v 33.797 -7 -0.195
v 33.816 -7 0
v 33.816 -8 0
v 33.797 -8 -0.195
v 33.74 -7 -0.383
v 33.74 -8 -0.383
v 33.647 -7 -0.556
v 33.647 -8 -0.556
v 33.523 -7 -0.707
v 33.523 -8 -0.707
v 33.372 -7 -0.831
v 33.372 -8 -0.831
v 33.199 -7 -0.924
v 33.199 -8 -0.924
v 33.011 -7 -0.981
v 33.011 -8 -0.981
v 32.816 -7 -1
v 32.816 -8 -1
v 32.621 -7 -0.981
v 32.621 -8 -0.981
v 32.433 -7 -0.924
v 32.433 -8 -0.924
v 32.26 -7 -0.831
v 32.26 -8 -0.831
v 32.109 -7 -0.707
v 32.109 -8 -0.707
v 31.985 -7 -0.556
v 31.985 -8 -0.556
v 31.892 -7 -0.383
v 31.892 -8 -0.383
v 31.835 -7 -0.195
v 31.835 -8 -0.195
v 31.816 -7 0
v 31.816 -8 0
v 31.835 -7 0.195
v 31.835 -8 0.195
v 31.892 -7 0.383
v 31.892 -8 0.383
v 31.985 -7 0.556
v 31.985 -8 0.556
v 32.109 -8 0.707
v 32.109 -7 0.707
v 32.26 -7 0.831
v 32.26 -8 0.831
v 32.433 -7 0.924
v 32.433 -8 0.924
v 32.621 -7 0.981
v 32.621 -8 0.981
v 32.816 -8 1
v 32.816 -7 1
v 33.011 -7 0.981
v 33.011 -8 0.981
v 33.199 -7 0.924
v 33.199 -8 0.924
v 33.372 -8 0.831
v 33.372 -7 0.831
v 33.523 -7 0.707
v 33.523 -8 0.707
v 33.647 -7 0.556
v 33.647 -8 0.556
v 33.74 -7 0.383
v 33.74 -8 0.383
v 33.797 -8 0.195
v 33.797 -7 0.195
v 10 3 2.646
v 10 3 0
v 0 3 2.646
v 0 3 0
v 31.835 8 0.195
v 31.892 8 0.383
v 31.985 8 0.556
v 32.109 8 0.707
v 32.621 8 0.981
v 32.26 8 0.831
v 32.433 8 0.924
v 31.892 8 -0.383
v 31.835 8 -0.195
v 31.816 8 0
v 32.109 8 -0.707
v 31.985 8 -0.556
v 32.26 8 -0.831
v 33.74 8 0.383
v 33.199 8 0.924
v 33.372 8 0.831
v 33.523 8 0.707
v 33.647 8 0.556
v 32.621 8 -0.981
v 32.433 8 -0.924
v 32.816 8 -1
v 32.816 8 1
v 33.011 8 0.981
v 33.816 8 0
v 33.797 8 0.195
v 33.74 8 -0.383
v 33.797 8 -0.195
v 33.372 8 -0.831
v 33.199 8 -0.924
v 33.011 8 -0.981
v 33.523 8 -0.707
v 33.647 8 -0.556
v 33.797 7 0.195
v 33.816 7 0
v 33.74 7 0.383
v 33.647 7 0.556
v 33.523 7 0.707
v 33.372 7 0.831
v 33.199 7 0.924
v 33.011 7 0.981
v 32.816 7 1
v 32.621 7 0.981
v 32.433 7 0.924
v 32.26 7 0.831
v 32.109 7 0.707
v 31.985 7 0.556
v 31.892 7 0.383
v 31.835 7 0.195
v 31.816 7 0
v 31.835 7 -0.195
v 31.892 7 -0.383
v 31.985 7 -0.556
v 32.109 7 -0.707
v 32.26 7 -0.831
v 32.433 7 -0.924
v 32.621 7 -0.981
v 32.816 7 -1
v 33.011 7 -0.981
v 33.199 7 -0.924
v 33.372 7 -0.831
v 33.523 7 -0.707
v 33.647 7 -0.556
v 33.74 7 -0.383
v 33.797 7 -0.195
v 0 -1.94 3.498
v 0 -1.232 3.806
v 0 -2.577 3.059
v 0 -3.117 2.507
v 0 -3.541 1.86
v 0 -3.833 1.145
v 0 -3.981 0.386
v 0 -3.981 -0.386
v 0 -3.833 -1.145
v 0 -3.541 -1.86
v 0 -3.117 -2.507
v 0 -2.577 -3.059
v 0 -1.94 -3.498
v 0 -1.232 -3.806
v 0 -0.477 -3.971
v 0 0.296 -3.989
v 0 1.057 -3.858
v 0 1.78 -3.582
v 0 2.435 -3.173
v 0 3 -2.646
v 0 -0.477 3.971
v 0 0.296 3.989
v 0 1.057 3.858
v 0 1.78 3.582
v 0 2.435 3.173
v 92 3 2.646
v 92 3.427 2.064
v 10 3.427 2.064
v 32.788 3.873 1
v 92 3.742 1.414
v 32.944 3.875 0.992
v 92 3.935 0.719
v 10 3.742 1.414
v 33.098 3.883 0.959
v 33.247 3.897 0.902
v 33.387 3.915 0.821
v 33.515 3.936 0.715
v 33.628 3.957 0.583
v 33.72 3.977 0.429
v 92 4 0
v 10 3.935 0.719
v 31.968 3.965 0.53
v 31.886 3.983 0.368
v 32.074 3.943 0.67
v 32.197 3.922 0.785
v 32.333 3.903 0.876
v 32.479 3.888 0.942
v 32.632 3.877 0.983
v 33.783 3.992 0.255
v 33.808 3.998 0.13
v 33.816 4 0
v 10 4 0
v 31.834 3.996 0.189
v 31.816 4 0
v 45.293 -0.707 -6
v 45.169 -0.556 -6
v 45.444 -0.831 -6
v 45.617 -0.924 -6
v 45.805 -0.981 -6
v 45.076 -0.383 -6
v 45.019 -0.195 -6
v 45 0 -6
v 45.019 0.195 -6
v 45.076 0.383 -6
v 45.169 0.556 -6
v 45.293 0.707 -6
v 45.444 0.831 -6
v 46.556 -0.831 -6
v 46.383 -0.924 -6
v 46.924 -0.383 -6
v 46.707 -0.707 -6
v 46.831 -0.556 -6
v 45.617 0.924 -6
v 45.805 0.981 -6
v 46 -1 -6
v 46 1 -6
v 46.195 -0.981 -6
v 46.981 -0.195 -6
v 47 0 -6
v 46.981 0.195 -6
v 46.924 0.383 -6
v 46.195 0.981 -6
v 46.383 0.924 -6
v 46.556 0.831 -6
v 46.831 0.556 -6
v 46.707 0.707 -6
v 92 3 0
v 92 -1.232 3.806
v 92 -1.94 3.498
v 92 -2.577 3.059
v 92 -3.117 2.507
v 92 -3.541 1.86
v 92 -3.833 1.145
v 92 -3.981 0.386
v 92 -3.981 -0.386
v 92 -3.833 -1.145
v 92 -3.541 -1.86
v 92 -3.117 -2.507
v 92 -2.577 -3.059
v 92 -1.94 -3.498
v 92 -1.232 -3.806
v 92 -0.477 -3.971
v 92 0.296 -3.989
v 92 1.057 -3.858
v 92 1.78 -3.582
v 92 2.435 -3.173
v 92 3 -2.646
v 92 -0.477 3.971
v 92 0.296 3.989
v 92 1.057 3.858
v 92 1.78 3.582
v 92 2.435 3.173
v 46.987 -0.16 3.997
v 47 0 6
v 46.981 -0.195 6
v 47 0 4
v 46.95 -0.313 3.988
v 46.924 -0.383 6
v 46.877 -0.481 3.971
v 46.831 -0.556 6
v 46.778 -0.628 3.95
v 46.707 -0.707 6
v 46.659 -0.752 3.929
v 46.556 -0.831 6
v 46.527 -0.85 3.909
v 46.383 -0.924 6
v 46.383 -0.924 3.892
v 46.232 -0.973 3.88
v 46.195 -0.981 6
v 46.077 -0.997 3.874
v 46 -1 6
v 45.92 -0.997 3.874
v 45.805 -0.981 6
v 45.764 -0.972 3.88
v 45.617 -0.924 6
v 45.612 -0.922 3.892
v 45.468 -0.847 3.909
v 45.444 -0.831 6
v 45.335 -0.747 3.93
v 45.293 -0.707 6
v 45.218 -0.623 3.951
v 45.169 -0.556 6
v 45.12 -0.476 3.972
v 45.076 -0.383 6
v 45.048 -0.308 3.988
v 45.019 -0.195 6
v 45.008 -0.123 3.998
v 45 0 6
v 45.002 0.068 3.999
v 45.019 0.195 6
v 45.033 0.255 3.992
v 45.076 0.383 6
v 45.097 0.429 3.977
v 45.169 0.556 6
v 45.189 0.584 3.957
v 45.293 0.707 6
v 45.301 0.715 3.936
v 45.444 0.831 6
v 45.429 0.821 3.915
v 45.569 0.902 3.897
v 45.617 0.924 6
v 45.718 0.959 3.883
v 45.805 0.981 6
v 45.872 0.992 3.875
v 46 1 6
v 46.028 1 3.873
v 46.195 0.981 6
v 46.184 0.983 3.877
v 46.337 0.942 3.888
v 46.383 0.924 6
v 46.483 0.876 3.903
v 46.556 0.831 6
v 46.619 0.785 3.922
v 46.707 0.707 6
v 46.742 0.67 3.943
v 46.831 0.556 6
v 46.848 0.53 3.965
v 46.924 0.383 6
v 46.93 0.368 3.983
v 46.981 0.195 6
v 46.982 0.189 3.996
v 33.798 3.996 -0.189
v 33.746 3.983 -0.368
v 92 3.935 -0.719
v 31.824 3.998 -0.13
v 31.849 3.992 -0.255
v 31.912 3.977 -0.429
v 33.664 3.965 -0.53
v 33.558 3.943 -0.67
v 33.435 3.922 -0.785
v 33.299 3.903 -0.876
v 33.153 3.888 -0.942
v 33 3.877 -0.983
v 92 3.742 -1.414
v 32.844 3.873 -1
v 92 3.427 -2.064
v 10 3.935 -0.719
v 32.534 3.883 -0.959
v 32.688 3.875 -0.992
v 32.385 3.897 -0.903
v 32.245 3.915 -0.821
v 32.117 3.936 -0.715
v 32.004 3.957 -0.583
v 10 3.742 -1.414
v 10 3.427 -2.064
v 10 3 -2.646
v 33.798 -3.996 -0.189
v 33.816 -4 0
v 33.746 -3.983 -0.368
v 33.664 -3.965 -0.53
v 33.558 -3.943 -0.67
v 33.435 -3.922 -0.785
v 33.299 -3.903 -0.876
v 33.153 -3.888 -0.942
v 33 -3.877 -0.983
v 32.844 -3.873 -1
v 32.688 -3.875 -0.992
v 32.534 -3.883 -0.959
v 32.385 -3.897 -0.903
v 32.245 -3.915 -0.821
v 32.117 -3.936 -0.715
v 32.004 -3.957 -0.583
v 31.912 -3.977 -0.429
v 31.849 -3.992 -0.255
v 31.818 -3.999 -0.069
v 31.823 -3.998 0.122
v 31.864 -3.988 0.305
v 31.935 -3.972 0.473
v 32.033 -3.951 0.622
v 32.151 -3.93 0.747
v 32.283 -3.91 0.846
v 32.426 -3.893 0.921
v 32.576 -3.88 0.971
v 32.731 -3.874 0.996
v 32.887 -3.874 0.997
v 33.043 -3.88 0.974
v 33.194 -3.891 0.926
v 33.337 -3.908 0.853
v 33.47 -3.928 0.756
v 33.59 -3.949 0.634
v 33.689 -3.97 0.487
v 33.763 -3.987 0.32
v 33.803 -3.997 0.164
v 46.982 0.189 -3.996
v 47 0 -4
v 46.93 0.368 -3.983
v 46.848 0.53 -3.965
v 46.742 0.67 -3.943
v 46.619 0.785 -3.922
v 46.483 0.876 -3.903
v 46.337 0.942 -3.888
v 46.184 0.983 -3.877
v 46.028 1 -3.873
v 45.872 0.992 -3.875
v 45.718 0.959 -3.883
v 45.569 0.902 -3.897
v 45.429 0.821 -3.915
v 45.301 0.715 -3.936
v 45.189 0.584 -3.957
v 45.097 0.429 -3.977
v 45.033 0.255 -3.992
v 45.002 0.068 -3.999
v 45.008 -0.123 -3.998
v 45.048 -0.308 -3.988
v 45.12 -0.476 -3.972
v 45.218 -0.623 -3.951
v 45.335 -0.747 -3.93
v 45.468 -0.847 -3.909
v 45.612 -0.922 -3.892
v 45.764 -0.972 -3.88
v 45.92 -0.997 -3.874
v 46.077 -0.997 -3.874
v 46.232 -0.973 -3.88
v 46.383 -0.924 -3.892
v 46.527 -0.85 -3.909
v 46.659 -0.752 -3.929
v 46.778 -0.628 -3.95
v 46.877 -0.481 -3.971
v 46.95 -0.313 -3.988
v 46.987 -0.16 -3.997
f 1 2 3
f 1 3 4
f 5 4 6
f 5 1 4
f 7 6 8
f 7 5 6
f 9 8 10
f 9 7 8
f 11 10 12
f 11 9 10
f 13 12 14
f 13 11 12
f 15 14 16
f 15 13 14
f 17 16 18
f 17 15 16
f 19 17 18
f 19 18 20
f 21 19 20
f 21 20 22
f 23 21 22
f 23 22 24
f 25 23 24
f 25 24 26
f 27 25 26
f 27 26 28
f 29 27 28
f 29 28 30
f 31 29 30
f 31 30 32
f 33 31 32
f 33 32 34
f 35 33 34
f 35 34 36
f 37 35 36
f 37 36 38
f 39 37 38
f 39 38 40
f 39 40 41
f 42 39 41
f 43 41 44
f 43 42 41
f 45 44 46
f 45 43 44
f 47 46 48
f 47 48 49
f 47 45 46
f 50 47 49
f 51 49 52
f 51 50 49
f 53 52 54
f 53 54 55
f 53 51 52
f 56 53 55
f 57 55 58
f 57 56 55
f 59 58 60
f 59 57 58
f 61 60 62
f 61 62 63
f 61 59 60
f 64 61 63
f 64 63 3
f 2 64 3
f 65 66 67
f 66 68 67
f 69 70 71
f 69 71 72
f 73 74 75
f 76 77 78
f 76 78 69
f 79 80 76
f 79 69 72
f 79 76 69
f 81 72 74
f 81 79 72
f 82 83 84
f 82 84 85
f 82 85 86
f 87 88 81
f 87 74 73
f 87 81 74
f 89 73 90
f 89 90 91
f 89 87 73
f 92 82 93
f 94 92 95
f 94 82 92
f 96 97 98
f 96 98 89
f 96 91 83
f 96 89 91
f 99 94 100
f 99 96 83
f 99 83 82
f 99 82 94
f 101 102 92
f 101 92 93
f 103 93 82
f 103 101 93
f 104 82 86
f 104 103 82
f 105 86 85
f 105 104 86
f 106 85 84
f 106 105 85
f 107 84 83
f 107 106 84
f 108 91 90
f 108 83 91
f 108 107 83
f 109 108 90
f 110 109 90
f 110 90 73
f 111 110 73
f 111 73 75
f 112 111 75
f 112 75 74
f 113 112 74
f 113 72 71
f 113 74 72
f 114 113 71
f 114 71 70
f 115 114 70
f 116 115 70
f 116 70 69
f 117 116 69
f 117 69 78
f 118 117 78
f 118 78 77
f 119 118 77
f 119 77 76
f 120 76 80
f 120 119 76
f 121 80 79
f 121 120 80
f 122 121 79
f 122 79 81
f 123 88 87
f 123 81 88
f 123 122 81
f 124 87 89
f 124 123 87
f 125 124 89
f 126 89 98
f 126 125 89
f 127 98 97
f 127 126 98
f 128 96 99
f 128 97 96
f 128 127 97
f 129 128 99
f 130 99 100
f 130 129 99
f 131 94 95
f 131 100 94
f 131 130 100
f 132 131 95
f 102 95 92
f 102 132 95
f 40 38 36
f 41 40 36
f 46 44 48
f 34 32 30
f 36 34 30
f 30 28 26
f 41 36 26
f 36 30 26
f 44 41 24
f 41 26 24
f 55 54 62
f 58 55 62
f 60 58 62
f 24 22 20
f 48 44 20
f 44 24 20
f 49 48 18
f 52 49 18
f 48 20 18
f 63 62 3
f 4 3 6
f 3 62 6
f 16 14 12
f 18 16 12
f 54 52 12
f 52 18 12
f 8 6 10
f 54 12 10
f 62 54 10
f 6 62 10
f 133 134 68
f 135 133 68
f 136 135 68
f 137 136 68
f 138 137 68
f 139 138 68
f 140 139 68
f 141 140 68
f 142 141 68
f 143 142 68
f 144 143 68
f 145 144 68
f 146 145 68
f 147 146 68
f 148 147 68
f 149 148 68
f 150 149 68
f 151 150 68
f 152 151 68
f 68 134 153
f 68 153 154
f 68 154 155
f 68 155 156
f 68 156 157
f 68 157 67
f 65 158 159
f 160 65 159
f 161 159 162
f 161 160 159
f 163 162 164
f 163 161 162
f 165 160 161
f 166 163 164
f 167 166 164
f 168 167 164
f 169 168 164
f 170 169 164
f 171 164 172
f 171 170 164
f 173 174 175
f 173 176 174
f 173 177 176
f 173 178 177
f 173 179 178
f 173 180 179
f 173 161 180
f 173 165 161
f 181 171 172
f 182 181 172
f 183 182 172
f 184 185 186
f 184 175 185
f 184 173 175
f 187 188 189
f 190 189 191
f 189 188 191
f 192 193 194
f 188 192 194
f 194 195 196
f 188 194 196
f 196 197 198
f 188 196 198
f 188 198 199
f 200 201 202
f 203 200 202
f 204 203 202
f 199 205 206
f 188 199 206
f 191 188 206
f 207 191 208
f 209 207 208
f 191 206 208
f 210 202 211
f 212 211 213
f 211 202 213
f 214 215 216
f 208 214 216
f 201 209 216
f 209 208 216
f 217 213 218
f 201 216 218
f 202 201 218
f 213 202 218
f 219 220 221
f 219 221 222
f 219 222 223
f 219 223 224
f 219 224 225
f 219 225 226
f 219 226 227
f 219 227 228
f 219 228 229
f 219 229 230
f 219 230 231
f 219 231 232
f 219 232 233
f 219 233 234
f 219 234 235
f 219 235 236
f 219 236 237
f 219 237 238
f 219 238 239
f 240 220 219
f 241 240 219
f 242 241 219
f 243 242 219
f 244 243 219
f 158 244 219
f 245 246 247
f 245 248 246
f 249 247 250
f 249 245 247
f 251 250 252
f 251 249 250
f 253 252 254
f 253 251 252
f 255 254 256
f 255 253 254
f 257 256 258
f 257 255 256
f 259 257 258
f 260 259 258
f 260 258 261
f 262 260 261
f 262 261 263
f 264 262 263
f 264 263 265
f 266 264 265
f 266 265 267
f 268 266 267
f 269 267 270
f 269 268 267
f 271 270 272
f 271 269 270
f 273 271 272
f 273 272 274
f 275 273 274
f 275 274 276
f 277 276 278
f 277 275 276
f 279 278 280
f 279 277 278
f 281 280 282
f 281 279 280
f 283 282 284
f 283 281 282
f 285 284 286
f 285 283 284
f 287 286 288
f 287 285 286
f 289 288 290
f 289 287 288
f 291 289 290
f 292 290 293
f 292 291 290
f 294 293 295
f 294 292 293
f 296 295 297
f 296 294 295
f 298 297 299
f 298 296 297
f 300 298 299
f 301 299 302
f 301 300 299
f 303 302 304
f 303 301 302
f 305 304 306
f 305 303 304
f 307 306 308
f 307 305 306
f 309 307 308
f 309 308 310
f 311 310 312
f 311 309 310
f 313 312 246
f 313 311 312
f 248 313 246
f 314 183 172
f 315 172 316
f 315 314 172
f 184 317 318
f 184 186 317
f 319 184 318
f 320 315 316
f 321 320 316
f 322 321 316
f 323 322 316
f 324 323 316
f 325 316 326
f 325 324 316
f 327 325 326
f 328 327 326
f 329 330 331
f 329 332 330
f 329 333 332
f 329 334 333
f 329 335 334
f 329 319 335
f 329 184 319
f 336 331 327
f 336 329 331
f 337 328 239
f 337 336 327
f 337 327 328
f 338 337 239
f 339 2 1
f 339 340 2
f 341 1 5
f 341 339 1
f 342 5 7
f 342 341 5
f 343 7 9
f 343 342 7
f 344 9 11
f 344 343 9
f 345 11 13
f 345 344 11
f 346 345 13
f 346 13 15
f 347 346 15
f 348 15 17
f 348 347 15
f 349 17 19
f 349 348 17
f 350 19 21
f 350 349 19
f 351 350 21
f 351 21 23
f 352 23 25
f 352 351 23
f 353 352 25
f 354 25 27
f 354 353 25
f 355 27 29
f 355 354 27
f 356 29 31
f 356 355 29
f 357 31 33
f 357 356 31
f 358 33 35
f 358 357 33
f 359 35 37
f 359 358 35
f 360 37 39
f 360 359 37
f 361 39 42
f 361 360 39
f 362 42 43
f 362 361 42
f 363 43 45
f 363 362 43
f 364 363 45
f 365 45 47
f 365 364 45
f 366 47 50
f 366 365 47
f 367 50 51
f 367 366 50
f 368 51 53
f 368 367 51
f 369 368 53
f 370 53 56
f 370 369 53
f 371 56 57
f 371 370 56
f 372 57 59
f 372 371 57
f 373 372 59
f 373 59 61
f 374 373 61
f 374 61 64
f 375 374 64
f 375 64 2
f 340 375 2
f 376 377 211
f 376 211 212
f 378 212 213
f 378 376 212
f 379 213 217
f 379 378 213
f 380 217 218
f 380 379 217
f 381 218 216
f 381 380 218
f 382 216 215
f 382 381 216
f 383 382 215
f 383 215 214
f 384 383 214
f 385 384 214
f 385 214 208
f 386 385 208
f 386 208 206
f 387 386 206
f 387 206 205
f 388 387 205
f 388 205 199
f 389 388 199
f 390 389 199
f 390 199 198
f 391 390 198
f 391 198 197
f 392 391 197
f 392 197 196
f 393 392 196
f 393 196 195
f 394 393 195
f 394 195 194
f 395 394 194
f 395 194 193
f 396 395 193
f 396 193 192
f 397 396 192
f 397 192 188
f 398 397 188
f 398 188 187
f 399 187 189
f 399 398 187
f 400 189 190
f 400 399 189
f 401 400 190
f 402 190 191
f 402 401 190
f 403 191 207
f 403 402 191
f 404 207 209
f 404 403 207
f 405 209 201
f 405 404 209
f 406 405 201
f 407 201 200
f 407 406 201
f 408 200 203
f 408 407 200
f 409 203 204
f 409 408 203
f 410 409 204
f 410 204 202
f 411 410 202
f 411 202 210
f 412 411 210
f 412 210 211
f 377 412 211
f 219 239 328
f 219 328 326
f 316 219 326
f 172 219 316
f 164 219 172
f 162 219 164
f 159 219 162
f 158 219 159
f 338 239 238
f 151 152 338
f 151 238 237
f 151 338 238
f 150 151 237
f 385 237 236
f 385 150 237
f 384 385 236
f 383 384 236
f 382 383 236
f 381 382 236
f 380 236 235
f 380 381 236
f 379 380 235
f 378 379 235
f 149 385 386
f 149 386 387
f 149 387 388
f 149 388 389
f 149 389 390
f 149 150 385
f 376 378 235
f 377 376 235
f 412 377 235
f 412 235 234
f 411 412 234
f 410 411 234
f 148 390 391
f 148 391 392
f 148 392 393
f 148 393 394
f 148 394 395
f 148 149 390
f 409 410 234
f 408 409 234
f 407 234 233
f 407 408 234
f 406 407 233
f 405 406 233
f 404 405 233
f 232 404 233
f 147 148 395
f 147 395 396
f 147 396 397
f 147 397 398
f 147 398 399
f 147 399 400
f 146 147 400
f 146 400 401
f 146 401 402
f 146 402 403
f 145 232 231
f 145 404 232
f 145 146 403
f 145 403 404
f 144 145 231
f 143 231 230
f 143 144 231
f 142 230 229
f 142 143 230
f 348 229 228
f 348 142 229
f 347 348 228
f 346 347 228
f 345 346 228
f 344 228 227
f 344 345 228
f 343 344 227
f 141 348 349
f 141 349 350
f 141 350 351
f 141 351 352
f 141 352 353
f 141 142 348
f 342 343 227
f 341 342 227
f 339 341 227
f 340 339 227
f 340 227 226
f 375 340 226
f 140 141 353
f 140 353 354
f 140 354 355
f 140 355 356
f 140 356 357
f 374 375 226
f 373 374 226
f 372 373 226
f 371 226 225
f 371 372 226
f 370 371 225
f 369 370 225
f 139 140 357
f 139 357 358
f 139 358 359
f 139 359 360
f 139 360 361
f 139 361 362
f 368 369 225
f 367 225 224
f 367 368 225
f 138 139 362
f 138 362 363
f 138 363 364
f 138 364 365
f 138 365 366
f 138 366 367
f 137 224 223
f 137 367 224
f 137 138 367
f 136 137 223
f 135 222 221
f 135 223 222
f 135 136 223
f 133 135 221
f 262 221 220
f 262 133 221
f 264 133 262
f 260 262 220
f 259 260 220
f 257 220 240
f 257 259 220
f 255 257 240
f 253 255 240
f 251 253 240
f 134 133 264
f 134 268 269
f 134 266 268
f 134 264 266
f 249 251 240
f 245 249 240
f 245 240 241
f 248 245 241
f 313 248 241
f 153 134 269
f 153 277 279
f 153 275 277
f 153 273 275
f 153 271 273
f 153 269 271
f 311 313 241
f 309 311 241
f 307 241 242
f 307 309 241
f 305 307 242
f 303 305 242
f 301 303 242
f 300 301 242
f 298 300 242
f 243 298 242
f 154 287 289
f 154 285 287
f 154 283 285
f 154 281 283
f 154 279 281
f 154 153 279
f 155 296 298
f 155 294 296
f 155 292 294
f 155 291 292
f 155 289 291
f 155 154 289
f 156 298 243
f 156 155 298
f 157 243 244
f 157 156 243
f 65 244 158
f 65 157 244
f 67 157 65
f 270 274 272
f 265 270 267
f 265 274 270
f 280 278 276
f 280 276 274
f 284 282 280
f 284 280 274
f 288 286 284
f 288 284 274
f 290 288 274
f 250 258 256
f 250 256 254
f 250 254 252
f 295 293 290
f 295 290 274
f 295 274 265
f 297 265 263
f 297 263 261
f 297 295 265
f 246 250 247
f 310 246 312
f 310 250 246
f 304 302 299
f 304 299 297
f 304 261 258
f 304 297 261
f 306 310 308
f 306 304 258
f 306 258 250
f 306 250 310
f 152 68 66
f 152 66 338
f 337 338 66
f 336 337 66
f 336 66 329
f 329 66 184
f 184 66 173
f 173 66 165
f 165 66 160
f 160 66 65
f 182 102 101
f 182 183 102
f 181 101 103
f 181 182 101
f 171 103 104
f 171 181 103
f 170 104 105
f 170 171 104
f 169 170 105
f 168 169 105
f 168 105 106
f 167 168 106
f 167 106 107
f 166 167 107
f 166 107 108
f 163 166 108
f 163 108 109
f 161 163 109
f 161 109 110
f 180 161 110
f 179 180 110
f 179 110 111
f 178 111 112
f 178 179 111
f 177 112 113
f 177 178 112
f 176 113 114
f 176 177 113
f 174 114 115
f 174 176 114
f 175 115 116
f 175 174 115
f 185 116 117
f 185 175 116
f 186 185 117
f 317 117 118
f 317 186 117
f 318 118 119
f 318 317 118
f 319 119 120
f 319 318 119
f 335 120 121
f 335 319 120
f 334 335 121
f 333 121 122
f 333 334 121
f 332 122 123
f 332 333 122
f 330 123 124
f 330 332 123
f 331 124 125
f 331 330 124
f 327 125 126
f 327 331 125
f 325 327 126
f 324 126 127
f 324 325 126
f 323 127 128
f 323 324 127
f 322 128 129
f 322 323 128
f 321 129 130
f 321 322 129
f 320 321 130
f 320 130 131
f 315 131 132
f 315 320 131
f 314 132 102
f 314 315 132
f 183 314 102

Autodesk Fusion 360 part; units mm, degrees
sketch "Esboço1" plane through (0, 0, 0) normal (1, 0, 0) x (0, 1, 0)
  circle A0 centre (0, 0) radius 4
  line L0 (0, 0) -> (3, 0) construction
  line L1 (3, 0) -> (3, -2.6458)
  line L2 (3, 0) -> (3, 2.6458)
  dimension "d1" = 8
  dimension "d2" = 3
extrude "Extrusão1" add sketch "Esboço1" along normal blind 92
extrude "Extrusão2" cut sketch "Esboço1" along normal blind 10 contours A0 L1 L2 picked at (3.6528, 0.1921)
sketch "Esboço2" plane through (0, 0, 0) normal (0, 1, 0) x (1, 0, 0)
sketch "Esboço3" plane through (0, 0, 0) normal (0, 0, 1) x (1, 0, 0)
  line L0 (0, 0) -> (46, 0) construction
  circle A0 centre (46, 0) radius 1
  dimension "d7" = 46
  dimension "d24" = 2
sketch "Esboço4" plane through (0, 0, 0) normal (0, 1, 0) x (1, 0, 0)
  line L0 (92, 0) -> (32.816, 0) construction
  circle A0 centre (32.816, 0) radius 1
  dimension "d13" = 59.184
  dimension "d23" = 2
extrude "Extrusão7" add sketch "Esboço3" along normal blind 6 and the other way blind 6
extrude "Extrusão8" add sketch "Esboço4" along normal blind 7 and the other way blind 7
extrude "Extrusão9" add 1 faces at (32.4233, -7, 0.2267) along direction (0, -1, 0) blind 1
extrude "Extrusão10" add 1 faces at (32.4233, 7, 0.2267) along direction (0, 1, 0) blind 1
sketch "Esboço5" plane through (0, -8, 0) normal (0, -1, 0) x (1, 0, 0)
  circle A0 centre (32.816, 0) radius 1
equation "d13 = 58.434 mm + 0.75 mm"
